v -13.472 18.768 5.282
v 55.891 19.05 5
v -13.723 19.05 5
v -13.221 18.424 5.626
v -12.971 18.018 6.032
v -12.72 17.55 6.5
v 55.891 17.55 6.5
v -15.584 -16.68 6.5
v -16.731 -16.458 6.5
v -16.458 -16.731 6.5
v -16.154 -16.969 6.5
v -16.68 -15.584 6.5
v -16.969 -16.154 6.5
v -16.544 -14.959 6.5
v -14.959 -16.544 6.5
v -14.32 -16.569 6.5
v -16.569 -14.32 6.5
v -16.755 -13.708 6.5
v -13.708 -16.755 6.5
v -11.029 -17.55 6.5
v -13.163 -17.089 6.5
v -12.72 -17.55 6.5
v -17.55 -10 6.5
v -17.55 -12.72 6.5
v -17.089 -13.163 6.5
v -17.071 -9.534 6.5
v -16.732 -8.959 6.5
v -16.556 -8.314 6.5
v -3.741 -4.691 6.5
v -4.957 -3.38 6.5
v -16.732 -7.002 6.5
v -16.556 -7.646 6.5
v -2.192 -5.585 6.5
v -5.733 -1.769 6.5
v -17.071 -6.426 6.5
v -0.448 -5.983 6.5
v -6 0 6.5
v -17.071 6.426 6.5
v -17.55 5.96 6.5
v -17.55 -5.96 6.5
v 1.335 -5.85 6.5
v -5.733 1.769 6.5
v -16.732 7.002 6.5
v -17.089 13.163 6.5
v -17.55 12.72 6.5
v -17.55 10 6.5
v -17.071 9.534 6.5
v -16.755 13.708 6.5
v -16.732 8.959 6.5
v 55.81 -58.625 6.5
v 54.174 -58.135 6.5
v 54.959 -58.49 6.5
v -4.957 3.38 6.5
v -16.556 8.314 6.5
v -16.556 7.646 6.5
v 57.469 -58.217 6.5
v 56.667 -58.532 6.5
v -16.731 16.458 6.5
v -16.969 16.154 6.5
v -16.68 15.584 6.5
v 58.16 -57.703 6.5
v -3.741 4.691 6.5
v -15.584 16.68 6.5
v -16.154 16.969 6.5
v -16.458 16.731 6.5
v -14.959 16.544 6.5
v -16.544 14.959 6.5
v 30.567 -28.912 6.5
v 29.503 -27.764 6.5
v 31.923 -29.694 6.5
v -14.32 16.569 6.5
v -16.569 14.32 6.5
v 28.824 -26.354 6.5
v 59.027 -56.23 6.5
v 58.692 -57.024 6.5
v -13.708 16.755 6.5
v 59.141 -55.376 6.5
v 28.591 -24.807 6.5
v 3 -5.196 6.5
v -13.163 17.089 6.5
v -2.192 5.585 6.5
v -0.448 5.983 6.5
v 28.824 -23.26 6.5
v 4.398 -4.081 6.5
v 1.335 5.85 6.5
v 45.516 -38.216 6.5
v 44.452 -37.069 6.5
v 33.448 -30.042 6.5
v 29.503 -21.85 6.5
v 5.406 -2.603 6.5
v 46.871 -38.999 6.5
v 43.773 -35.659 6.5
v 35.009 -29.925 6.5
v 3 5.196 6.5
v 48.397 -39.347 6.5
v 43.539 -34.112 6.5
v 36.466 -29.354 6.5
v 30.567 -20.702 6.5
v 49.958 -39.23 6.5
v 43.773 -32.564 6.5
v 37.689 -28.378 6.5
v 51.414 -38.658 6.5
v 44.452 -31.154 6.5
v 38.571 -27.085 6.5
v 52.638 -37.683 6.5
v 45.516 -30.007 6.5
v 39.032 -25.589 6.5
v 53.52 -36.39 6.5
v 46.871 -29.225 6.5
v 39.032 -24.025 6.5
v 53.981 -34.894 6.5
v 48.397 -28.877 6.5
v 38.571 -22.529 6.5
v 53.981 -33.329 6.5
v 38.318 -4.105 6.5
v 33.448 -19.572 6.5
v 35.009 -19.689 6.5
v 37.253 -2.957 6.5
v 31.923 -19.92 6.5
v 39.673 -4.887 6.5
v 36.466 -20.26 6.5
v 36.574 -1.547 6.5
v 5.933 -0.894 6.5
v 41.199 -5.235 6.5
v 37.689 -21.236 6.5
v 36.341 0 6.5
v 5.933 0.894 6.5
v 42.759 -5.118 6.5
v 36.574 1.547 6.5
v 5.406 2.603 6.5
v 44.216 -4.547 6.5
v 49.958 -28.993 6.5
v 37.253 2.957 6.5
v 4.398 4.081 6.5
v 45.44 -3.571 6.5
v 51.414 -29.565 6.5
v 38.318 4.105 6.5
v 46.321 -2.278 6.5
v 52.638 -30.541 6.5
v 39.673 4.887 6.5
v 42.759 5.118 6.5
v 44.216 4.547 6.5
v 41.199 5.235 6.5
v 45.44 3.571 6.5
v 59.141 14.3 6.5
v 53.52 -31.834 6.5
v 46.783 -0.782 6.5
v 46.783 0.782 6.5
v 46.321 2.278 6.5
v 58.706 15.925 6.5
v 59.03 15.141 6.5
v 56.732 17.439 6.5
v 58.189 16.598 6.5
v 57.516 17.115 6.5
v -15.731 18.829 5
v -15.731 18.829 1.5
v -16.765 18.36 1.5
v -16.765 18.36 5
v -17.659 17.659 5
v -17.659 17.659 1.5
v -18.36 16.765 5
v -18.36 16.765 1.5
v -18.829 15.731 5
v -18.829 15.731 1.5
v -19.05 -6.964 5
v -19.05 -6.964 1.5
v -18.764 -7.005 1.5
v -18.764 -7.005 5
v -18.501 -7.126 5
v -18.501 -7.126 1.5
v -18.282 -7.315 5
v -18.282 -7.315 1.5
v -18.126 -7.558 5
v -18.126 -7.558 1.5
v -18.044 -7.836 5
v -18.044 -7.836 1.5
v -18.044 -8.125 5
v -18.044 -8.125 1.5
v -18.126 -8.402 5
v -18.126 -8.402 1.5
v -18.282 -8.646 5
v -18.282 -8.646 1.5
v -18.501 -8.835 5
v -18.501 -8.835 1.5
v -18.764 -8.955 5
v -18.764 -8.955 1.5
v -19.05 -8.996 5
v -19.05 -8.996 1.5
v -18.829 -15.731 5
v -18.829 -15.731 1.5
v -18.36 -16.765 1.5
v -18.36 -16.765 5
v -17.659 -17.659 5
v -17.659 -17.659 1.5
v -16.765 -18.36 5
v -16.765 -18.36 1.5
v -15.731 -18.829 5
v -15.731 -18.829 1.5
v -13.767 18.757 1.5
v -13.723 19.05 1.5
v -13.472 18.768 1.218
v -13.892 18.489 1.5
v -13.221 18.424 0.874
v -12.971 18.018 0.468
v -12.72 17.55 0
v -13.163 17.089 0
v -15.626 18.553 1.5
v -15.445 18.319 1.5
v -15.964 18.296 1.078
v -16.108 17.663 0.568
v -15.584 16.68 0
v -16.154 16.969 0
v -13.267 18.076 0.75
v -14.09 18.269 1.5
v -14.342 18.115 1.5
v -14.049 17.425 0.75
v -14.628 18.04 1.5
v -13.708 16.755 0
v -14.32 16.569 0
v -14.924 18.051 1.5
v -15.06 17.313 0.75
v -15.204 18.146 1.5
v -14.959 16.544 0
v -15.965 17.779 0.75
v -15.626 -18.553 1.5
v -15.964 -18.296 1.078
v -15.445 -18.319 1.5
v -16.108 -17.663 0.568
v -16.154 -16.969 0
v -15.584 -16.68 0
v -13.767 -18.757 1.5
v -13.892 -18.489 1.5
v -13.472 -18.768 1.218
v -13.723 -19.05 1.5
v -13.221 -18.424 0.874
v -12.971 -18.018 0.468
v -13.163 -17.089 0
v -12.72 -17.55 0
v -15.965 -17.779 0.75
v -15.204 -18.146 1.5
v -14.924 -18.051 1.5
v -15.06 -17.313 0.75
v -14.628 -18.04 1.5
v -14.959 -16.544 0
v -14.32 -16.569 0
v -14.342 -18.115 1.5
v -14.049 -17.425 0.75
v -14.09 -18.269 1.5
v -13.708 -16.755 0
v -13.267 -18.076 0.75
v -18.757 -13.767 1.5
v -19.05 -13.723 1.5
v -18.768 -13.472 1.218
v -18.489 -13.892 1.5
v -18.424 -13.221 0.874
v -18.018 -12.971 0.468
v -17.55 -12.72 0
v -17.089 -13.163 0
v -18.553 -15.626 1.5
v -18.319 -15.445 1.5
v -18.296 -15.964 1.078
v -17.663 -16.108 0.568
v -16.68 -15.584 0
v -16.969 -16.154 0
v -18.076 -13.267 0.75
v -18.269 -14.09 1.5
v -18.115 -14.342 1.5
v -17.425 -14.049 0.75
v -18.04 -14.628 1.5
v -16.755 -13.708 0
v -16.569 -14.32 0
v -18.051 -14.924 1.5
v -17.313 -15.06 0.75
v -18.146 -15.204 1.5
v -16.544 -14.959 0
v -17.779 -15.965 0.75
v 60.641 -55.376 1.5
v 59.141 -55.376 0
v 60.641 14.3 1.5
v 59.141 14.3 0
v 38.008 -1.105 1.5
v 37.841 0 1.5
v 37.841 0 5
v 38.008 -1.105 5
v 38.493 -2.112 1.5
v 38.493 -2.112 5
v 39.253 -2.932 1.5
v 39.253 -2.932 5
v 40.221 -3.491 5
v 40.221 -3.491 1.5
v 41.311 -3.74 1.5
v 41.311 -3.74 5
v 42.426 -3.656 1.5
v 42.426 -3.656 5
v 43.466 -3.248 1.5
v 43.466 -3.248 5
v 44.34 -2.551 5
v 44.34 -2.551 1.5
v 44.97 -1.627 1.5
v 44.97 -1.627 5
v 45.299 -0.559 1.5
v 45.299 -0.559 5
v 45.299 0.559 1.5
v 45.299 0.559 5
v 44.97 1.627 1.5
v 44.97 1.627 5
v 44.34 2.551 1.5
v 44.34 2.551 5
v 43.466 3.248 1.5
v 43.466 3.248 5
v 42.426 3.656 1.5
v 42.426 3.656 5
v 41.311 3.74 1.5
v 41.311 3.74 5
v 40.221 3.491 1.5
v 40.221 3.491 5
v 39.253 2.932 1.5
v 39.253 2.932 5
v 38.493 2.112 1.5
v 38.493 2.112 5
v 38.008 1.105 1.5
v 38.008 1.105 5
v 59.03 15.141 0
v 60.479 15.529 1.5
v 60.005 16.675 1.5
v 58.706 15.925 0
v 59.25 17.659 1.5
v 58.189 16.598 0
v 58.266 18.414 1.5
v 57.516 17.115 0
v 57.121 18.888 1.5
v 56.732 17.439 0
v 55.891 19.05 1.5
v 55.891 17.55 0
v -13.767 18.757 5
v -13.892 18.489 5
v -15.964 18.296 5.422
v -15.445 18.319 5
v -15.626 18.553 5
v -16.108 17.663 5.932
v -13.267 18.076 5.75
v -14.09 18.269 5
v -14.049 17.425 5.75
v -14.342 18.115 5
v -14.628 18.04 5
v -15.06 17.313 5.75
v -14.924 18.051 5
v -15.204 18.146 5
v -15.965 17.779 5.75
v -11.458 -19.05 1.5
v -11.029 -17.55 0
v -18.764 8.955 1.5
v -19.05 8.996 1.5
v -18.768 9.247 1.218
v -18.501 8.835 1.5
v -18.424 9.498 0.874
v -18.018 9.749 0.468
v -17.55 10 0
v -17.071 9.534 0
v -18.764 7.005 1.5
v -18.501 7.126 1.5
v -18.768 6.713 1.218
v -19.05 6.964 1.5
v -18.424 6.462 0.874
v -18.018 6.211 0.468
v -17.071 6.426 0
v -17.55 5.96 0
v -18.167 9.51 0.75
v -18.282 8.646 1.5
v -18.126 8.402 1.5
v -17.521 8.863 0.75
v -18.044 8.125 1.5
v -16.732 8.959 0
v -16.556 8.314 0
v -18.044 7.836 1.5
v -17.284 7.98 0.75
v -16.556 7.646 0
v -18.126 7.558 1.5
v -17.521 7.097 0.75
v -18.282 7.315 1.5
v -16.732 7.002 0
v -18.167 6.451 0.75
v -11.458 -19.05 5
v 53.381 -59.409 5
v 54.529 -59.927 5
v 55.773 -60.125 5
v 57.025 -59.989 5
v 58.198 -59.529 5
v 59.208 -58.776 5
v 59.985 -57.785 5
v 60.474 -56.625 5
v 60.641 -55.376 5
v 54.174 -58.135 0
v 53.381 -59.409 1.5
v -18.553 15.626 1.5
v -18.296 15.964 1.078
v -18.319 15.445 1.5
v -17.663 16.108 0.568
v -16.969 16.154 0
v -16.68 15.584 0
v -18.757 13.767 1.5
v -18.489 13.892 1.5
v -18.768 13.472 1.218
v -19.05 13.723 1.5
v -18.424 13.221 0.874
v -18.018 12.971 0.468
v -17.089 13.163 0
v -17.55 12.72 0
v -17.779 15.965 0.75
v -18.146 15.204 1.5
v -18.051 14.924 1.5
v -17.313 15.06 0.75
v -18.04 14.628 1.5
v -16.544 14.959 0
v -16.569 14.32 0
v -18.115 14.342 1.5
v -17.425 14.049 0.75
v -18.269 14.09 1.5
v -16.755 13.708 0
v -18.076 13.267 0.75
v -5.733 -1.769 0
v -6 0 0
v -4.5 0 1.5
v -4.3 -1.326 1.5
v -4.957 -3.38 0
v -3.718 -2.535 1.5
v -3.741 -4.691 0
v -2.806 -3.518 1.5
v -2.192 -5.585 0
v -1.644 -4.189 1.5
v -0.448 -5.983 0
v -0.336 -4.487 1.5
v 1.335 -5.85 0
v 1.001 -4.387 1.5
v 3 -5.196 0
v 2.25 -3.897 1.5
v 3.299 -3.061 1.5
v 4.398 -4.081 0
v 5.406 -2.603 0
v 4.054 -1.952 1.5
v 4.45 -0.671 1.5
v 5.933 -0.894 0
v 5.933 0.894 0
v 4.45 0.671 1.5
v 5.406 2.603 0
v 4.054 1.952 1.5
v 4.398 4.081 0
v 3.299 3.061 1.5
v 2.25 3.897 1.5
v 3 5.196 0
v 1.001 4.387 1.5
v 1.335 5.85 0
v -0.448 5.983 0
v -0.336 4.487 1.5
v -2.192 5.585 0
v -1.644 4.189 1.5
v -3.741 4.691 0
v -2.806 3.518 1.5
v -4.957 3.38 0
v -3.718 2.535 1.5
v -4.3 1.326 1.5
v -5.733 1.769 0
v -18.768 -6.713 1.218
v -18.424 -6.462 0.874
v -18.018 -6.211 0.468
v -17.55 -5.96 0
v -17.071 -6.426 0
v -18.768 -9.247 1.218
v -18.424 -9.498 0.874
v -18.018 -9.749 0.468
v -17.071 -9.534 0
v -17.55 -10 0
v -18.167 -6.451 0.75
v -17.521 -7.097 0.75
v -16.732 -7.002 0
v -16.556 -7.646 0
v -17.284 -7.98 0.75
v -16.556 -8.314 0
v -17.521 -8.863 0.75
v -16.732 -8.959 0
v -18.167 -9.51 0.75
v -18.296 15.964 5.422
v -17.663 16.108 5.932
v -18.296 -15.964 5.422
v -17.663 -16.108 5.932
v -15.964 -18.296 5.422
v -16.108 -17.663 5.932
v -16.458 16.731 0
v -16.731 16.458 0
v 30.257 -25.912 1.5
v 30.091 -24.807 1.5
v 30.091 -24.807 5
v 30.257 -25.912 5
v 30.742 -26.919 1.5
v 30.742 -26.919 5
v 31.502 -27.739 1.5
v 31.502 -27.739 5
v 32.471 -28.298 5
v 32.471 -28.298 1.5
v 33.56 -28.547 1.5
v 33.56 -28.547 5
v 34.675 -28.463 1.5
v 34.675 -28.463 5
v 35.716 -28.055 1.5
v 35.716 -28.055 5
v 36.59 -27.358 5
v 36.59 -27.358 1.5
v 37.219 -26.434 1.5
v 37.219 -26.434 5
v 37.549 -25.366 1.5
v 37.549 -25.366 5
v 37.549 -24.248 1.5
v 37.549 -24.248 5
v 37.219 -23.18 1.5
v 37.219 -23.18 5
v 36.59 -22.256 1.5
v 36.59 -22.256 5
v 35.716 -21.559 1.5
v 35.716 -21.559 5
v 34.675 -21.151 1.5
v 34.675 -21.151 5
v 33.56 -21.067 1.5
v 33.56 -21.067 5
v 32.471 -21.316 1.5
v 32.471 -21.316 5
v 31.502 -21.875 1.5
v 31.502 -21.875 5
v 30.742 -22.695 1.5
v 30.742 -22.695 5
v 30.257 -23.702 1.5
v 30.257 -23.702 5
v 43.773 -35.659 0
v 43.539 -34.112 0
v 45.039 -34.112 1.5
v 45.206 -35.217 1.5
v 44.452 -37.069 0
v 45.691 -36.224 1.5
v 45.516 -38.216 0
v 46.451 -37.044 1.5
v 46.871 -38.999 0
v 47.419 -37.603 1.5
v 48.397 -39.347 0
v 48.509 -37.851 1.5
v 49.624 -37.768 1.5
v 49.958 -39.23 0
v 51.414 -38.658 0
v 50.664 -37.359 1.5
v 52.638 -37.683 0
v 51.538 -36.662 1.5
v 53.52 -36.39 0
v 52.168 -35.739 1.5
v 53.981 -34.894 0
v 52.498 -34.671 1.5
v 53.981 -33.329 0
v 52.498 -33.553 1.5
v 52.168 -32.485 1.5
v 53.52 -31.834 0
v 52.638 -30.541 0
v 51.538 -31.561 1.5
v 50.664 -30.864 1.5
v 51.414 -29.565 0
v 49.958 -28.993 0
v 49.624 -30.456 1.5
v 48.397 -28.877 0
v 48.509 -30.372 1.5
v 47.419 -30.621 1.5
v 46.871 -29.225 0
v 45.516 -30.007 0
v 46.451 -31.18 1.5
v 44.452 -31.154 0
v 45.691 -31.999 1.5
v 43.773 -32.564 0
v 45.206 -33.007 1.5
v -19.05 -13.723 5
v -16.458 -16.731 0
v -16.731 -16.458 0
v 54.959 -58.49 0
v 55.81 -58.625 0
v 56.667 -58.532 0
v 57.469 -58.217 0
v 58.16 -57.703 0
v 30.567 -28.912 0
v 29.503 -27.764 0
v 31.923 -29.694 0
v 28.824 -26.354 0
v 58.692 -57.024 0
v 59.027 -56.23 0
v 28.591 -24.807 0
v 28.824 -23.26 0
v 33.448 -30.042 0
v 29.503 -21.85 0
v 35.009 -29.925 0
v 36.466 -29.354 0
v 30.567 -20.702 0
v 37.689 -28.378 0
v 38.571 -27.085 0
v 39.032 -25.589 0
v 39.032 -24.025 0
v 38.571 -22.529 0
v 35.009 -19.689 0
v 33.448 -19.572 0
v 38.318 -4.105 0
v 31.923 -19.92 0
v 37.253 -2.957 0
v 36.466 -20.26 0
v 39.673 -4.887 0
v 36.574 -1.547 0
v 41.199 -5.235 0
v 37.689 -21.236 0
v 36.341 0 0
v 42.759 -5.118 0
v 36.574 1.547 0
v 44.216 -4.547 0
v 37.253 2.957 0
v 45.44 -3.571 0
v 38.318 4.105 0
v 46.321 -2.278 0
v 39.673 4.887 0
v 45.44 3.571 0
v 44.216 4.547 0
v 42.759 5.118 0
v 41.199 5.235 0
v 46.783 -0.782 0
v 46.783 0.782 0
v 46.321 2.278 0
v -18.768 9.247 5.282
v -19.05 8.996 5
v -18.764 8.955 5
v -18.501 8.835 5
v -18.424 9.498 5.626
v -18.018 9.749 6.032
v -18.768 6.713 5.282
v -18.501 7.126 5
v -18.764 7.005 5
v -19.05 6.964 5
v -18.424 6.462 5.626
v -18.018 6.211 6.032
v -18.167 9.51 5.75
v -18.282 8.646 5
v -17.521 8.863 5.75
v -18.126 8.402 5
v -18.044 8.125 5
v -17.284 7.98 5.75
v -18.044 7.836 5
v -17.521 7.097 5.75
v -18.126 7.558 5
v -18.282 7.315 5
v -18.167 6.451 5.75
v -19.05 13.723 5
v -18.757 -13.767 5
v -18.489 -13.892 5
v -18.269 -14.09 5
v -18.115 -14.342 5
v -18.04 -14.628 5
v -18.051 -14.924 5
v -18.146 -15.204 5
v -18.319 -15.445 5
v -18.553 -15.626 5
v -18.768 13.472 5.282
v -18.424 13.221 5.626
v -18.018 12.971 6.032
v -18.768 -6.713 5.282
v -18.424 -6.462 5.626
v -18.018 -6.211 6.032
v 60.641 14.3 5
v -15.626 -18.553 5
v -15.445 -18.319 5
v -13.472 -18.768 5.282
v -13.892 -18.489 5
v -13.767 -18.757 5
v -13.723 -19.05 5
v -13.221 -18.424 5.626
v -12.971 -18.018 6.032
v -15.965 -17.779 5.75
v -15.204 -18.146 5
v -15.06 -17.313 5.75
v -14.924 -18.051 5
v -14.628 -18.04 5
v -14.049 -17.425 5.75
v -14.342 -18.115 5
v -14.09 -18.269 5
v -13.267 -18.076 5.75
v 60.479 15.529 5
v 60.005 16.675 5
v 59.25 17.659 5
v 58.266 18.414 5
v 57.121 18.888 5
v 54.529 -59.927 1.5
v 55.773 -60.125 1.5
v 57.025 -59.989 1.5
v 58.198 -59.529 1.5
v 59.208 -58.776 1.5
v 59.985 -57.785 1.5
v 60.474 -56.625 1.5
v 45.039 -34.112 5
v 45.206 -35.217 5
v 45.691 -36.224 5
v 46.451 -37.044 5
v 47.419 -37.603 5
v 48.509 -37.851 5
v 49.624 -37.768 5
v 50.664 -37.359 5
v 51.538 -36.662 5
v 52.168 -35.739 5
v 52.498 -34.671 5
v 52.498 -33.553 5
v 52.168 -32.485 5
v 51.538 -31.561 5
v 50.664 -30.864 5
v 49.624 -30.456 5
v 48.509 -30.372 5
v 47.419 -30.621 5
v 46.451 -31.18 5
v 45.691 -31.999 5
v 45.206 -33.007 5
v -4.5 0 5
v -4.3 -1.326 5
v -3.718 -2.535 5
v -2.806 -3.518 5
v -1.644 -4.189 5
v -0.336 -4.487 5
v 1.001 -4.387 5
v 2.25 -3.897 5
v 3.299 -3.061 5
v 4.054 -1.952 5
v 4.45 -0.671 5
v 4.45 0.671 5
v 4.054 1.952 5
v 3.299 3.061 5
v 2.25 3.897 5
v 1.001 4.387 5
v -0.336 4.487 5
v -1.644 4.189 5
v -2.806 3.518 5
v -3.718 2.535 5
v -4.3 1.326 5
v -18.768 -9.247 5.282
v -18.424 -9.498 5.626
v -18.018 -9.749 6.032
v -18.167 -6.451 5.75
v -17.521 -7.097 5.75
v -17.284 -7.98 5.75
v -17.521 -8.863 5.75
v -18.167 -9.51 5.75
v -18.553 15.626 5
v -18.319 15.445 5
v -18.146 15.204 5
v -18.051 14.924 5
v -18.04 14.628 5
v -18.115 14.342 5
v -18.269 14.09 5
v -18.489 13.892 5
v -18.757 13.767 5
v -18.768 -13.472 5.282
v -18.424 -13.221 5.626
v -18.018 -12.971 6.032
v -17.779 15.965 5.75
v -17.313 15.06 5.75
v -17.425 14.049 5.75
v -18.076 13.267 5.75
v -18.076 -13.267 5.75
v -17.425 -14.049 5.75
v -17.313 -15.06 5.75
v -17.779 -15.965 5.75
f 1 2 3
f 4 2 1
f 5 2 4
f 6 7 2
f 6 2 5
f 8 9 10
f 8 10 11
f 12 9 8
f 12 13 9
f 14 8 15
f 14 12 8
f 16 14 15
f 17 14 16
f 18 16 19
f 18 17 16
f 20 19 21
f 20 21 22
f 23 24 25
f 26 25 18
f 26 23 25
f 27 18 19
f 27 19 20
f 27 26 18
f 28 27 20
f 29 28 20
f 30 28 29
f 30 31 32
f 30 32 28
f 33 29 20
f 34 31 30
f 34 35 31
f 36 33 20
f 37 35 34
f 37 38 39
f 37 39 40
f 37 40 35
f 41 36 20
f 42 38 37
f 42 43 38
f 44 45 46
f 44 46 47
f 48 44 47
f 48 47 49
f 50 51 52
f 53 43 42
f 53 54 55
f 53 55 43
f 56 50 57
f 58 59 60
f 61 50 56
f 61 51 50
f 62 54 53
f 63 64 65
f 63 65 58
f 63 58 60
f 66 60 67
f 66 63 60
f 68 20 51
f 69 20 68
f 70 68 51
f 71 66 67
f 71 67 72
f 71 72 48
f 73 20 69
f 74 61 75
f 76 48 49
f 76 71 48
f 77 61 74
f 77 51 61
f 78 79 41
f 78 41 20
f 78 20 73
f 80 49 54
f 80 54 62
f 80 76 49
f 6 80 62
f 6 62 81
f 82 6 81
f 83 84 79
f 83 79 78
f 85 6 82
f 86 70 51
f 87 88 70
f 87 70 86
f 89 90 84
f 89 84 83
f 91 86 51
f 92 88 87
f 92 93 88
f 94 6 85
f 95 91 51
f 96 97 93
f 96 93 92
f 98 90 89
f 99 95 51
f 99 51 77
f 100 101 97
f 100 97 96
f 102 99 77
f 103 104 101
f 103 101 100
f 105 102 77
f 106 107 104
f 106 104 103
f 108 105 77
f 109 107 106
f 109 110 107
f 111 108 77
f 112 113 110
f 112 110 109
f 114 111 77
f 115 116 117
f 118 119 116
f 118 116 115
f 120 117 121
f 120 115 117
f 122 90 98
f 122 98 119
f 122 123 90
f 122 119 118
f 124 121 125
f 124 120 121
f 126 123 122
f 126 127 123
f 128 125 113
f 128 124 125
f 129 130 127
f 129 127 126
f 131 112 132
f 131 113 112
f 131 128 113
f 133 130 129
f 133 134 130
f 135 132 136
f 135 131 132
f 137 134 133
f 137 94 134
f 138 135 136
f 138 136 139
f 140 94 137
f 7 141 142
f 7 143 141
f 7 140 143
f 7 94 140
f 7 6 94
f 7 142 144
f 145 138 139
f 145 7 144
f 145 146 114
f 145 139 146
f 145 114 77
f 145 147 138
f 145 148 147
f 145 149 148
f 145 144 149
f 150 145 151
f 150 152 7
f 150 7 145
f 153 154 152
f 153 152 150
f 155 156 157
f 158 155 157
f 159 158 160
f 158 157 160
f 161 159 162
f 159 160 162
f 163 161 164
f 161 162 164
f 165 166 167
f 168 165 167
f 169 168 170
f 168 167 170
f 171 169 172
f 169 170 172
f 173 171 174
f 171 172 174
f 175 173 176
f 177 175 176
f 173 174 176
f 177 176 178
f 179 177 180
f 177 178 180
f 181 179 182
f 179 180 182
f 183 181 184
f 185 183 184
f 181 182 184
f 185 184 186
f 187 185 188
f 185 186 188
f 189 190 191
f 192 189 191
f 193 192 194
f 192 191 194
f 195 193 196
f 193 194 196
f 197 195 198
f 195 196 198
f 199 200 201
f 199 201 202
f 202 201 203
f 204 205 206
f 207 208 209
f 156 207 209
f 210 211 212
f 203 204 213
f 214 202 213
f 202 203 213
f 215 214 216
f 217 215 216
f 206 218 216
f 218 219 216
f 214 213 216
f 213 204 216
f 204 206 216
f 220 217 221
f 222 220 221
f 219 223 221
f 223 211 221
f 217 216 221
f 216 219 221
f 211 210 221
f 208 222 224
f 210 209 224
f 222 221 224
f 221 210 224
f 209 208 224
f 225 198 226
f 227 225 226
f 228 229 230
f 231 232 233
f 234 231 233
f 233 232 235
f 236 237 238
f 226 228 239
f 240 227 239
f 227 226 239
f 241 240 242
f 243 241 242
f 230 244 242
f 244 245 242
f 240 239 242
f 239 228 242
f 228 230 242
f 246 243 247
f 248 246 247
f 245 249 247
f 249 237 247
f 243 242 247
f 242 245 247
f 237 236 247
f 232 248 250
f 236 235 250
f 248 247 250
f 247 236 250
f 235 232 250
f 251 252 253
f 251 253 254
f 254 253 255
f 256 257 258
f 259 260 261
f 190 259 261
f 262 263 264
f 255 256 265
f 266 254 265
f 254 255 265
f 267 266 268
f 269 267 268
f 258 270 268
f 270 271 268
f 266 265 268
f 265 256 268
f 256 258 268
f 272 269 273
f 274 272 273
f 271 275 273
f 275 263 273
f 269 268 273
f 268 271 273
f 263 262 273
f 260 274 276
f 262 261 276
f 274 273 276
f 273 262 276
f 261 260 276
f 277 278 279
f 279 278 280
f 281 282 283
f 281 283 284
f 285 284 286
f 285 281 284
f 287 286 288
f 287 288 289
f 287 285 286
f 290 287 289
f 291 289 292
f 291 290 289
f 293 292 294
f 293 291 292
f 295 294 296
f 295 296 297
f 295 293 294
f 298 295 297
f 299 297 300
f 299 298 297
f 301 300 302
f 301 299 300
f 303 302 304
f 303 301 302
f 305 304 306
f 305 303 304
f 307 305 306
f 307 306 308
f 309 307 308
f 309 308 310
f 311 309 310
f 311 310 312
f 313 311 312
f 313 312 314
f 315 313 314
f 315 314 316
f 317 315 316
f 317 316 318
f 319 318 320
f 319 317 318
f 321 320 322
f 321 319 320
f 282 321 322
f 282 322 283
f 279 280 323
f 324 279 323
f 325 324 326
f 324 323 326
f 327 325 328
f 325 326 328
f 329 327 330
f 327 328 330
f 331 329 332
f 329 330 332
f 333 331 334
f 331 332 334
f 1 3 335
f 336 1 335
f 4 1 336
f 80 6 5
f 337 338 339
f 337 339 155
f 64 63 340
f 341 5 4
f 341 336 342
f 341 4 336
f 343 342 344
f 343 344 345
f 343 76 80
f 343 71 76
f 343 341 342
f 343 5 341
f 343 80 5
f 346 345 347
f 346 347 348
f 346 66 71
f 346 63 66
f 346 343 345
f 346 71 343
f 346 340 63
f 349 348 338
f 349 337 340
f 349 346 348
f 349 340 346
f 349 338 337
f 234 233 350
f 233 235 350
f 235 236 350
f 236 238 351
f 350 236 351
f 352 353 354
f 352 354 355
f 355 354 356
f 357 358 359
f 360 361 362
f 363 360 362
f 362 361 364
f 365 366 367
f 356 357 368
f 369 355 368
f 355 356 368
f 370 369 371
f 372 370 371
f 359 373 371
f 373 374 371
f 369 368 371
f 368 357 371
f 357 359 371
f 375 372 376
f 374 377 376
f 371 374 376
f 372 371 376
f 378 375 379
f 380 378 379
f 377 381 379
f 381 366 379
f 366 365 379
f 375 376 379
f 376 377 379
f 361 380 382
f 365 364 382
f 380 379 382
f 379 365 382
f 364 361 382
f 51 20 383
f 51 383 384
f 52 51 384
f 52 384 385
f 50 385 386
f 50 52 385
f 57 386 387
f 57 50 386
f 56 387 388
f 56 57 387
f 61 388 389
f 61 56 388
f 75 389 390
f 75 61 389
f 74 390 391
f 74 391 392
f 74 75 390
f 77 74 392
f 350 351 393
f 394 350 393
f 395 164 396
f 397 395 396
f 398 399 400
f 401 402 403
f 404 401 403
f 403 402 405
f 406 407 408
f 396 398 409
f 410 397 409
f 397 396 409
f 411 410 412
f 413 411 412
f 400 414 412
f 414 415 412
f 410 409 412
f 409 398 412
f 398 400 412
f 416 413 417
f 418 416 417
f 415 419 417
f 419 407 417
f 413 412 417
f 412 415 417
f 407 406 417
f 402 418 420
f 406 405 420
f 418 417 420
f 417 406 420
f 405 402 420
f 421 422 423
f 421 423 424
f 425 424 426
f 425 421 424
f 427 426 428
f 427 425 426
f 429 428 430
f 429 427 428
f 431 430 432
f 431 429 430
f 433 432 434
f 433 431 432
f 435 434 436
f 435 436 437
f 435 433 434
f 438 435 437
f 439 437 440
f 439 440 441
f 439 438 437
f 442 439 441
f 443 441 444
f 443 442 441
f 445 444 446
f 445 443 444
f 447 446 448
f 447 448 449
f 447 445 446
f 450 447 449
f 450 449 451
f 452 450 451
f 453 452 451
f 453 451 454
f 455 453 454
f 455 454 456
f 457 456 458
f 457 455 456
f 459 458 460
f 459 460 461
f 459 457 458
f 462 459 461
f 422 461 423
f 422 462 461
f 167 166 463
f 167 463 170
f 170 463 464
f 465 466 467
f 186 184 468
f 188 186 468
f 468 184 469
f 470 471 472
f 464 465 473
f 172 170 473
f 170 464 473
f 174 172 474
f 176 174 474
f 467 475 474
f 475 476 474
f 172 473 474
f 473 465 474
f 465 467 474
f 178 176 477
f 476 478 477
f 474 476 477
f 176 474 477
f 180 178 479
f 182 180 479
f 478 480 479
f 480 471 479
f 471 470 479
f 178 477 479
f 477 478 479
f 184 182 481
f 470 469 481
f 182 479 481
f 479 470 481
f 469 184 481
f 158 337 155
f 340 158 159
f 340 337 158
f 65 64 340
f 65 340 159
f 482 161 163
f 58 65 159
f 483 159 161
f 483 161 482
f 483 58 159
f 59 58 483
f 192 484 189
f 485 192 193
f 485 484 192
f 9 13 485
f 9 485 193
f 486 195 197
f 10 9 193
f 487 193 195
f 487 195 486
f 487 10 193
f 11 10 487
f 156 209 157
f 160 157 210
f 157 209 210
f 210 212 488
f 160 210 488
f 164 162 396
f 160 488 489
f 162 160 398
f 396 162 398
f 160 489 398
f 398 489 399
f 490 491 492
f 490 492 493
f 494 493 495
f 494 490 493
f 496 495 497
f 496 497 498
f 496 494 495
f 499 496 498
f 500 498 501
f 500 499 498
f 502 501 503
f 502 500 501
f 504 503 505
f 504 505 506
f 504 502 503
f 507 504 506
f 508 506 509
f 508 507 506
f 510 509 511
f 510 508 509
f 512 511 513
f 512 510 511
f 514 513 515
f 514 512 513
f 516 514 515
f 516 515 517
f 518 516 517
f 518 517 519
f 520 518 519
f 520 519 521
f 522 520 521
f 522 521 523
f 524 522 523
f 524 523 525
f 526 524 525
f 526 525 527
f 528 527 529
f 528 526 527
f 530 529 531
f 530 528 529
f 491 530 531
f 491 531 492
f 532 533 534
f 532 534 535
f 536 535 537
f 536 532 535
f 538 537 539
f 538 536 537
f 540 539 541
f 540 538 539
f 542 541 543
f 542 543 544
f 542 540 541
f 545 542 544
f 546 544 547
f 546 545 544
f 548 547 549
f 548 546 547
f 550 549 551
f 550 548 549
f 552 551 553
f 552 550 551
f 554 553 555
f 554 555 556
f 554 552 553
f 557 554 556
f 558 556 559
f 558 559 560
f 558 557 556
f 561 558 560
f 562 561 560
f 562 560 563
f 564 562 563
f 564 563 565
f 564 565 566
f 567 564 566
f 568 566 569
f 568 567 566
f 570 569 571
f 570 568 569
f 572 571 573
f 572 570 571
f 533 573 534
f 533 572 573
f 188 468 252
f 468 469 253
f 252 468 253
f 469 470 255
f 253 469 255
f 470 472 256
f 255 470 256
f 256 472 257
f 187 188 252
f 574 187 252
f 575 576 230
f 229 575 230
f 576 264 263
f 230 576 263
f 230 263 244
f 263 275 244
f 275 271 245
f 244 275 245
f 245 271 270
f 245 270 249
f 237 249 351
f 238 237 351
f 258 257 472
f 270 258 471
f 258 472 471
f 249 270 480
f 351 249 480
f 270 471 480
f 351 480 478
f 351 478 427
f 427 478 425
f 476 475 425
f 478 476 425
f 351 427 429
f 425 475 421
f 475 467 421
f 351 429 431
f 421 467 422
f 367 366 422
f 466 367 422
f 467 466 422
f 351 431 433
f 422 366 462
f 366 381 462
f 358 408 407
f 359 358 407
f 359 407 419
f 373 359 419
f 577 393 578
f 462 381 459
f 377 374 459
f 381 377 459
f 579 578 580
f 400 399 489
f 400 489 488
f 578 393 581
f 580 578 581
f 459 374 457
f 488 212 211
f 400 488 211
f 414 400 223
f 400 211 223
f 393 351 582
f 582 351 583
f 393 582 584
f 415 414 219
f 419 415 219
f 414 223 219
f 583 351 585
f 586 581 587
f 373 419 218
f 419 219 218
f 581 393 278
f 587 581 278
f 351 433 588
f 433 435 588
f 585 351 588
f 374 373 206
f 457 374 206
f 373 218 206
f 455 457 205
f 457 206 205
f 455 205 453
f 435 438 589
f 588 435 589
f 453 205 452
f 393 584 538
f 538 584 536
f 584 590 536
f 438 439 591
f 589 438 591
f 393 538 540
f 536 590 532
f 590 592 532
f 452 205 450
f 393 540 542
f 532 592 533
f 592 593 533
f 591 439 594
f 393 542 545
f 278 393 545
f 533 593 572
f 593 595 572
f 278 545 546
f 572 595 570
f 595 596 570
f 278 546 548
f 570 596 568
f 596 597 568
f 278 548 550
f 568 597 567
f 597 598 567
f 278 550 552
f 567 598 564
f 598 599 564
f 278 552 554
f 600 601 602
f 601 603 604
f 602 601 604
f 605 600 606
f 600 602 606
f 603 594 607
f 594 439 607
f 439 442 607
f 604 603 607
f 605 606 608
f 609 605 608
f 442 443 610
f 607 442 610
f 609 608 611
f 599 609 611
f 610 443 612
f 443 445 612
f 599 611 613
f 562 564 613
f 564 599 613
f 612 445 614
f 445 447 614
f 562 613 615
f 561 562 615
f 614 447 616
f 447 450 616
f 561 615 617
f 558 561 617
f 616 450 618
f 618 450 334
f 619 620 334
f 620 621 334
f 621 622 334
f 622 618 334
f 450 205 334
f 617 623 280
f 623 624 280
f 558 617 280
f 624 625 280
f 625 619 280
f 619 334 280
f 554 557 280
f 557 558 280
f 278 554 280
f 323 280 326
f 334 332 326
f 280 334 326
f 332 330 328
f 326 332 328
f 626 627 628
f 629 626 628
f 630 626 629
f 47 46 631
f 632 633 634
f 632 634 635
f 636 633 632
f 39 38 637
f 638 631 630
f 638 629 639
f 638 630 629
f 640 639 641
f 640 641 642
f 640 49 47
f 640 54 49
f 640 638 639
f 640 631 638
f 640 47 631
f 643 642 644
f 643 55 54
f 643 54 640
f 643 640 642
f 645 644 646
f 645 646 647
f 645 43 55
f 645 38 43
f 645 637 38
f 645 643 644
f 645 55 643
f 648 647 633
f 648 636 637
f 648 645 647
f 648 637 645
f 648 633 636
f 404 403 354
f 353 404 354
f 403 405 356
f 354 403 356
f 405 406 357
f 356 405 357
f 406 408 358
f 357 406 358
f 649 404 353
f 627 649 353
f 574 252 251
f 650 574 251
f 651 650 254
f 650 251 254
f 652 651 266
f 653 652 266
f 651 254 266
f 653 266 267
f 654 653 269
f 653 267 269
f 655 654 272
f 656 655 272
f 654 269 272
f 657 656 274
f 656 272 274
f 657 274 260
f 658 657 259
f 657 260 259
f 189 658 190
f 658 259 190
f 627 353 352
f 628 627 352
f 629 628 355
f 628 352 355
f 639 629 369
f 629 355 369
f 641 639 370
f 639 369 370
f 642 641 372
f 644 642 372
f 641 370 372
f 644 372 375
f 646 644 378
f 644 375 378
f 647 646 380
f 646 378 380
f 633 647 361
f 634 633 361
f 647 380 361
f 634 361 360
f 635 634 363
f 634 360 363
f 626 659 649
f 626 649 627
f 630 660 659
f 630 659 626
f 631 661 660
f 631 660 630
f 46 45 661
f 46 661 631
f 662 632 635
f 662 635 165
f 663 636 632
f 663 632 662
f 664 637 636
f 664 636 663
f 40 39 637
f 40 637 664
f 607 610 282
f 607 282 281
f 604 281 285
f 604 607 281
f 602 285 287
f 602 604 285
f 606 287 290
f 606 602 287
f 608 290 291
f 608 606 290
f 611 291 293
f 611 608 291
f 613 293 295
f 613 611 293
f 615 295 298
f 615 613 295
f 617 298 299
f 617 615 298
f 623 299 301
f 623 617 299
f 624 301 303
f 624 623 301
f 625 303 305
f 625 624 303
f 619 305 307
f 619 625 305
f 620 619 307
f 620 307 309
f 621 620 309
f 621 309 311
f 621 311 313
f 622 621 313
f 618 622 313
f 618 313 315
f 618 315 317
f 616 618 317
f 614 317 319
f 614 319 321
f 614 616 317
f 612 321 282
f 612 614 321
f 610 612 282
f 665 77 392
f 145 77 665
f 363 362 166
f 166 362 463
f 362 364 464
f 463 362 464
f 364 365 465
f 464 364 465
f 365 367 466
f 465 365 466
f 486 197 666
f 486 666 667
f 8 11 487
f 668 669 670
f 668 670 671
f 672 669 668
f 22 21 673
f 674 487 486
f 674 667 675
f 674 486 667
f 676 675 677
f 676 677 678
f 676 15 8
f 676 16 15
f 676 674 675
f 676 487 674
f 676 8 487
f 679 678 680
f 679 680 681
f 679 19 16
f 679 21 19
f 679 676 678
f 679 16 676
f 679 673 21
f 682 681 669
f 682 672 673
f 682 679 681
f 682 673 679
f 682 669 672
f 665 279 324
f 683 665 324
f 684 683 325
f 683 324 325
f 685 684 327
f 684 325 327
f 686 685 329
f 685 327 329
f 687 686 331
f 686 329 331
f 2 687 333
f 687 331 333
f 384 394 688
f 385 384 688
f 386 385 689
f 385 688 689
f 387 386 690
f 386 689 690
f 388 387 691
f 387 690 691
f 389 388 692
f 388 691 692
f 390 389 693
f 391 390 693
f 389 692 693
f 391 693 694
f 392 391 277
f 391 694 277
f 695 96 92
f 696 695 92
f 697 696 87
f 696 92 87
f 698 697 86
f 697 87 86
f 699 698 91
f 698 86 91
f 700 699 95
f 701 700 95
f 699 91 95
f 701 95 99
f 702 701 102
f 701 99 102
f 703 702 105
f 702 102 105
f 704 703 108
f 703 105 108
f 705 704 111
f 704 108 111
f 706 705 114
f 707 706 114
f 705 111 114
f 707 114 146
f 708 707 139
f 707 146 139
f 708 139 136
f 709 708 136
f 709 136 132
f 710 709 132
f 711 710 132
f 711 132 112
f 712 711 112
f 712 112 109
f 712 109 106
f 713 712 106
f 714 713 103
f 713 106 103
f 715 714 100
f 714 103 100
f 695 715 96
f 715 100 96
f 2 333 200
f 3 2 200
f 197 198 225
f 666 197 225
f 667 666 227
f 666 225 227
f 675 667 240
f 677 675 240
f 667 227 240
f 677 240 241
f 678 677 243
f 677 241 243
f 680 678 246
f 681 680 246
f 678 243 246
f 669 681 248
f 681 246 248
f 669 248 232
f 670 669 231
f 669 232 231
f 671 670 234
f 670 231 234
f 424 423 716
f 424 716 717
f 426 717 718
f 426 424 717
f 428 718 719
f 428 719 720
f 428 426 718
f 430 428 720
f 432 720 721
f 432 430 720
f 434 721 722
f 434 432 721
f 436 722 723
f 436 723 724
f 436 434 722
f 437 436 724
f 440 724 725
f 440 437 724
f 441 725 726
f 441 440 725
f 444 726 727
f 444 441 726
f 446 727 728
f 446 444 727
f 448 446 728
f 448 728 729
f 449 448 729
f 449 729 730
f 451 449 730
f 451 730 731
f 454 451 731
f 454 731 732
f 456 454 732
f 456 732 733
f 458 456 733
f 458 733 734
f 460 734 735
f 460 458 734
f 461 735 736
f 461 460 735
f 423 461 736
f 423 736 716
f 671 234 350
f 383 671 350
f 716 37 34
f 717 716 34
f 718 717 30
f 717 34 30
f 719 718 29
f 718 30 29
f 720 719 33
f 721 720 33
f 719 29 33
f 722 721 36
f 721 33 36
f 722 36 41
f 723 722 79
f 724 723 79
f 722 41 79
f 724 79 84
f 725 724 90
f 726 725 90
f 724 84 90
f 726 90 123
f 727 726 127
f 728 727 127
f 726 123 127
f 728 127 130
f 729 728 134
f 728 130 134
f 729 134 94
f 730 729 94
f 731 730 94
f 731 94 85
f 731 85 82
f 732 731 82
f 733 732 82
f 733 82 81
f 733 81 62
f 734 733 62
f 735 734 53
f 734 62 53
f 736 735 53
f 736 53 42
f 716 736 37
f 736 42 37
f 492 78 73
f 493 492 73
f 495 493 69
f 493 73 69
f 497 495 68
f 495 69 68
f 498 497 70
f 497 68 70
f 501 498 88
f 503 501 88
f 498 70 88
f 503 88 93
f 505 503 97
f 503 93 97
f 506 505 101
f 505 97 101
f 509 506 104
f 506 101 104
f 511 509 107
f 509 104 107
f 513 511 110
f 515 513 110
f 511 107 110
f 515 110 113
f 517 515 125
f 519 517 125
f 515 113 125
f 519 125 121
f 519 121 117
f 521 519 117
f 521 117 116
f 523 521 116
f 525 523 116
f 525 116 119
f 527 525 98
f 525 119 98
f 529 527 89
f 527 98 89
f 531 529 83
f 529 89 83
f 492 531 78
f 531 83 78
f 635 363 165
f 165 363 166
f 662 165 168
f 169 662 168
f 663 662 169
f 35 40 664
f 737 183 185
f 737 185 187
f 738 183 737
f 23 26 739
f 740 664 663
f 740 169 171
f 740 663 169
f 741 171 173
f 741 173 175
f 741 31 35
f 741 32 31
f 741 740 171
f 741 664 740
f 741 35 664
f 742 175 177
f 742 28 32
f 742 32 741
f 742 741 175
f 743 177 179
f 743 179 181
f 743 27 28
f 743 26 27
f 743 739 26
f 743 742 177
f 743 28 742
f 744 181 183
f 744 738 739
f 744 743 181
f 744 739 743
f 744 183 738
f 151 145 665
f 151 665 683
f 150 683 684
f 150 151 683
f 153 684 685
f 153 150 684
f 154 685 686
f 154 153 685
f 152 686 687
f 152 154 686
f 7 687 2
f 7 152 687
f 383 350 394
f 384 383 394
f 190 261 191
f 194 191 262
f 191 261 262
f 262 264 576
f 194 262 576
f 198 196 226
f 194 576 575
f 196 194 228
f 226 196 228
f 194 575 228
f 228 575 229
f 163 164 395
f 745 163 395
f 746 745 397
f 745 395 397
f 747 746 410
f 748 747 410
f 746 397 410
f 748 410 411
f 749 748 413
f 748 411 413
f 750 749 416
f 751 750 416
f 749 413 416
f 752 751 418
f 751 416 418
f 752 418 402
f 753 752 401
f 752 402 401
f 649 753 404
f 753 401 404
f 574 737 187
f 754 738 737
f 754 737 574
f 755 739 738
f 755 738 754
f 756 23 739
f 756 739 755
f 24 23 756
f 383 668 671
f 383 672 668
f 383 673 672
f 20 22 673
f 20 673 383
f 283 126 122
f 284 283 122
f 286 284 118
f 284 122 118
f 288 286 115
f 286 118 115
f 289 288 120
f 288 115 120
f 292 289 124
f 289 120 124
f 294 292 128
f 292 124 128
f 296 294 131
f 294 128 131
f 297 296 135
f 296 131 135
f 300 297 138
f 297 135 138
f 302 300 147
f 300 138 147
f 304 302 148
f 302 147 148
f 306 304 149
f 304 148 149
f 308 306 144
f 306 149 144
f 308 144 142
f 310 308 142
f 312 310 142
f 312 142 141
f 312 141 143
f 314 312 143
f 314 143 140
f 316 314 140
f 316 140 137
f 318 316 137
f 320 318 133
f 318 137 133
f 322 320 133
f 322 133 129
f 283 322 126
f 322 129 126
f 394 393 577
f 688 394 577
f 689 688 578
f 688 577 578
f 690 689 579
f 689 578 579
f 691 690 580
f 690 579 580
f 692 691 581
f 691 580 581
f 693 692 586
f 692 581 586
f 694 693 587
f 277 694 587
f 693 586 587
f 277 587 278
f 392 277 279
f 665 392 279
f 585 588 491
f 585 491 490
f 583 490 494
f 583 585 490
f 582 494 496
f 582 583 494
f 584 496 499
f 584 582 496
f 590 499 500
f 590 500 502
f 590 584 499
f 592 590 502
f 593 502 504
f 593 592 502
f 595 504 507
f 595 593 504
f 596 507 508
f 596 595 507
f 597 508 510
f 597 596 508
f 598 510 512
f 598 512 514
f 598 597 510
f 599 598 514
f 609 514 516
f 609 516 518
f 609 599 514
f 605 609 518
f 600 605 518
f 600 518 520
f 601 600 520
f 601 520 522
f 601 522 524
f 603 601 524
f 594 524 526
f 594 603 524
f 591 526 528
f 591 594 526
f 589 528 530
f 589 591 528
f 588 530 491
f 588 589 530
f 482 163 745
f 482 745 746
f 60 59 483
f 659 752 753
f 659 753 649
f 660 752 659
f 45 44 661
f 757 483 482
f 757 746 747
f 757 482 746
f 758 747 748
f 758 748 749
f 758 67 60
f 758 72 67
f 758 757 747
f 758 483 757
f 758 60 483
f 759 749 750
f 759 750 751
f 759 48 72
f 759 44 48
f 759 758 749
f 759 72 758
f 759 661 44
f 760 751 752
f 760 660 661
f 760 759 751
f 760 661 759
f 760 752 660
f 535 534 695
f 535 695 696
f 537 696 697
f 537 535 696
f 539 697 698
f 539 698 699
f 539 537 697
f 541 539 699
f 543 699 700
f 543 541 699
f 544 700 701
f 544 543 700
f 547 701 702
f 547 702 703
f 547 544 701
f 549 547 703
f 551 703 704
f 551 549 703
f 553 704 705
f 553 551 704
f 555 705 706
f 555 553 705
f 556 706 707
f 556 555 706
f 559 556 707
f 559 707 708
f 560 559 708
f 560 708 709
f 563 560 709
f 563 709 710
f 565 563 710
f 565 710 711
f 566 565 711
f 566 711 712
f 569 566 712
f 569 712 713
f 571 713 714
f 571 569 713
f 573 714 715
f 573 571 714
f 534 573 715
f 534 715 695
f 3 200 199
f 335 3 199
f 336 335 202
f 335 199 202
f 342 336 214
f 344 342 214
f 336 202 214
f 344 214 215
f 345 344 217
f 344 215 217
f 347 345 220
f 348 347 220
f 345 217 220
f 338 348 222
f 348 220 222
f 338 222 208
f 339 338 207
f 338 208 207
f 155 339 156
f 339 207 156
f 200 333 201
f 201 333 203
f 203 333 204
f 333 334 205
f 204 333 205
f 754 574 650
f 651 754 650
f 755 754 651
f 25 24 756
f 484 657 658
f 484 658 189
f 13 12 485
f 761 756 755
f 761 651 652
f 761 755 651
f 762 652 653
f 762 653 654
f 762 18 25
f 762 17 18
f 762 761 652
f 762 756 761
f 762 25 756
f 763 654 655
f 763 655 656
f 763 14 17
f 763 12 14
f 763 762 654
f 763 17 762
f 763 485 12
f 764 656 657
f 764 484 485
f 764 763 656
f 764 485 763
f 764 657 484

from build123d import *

# Parameters (mm, degrees)
SKETCH1_R           = 3.75
SKETCH1_R_2         = 4.5
BOSS_EXTRUDE1_DEPTH = 6.5
CHAMFER1_SIZE       = 1.5


with BuildPart() as part:
    # Sketch1 → Boss-Extrude1 (new body)
    with BuildSketch(Plane.XY):
        with BuildLine():
            Line((-11.458079381, -19.05), (53.381074139, -59.408818568))
            ThreePointArc((53.381074139, -59.408818568), (58.197626483, -59.528635467), (60.641156228, -55.376203052))
            Line((60.641156228, -55.376203052), (60.641156228, 14.3))
            ThreePointArc((60.641156228, 14.3), (59.249913439, 17.658757211), (55.891156228, 19.05))
            Line((55.891156228, 19.05), (-13.723477062, 19.05))
            ThreePointArc((-13.723477062, 19.05), (-14.628464695, 18.040083046), (-15.73121772, 18.829304583))
            ThreePointArc((-15.73121772, 18.829304583), (-17.658815789, 17.658815789), (-18.829304583, 15.73121772))
            ThreePointArc((-18.829304583, 15.73121772), (-18.040083046, 14.628464695), (-19.05, 13.723477062))
            Line((-19.05, 13.723477062), (-19.05, 8.996305235))
            ThreePointArc((-19.05, 8.996305235), (-18.034, 7.980305235), (-19.05, 6.964305235))
            Line((-19.05, 6.964305235), (-19.05, -6.964305235))
            ThreePointArc((-19.05, -6.964305235), (-18.034, -7.980305235), (-19.05, -8.996305235))
            Line((-19.05, -8.996305235), (-19.05, -13.723477062))
            ThreePointArc((-19.05, -13.723477062), (-18.040083046, -14.628464695), (-18.829304583, -15.73121772))
            ThreePointArc((-18.829304583, -15.73121772), (-17.658815789, -17.658815789), (-15.73121772, -18.829304583))
            ThreePointArc((-15.73121772, -18.829304583), (-14.628464695, -18.040083046), (-13.723477062, -19.05))
            Line((-13.723477062, -19.05), (-11.458079381, -19.05))
        make_face()
        with Locations(Location((48.789415314, -34.11185183, 0), (0, 0, 180))):
            Circle(SKETCH1_R, mode=Mode.SUBTRACT)
        with Locations(Location((33.840565899, -24.807012569, 0), (0, 0, 180))):
            Circle(SKETCH1_R, mode=Mode.SUBTRACT)
        with Locations(Location((41.591156228, 0, 0), (0, 0, 180))):
            Circle(SKETCH1_R, mode=Mode.SUBTRACT)
        with Locations(Location((0, 0, 0), (0, 0, 180))):
            Circle(SKETCH1_R_2, mode=Mode.SUBTRACT)
    extrude(amount=BOSS_EXTRUDE1_DEPTH)

    # Chamfer1
    chamfer1_edges = [part.edges().sort_by_distance(p)[0] for p in [
        (-14.628464695, -18.040083046, 6.5),
        (4.5, 0, 6.5),
        (45.341156228, 0, 6.5),
        (37.590565899, -24.807012569, 6.5),
        (52.539415314, -34.11185183, 6.5),
        (-12.590778221, -19.05, 6.5),
        (20.961497379, -39.229409284, 6.5),
        (52.539415314, -34.11185183, 0),
        (37.590565899, -24.807012569, 0),
        (58.197626483, -59.528635467, 6.5),
        (45.341156228, 0, 0),
        (4.5, 0, 0),
        (-17.658815789, -17.658815789, 0),
        (-18.040083046, -14.628464695, 0),
        (-19.05, -11.359891149, 0),
        (-18.034, -7.980305235, 0),
        (-19.05, 0, 0),
        (-18.034, 7.980305235, 0),
        (-19.05, 11.359891149, 0),
        (-18.040083046, 14.628464695, 0),
        (60.641156228, -20.538101526, 6.5),
        (-17.658815789, 17.658815789, 0),
        (-14.628464695, 18.040083046, 0),
        (21.083839583, 19.05, 0),
        (59.249913439, 17.658757211, 0),
        (60.641156228, -20.538101526, 0),
        (58.197626483, -59.528635467, 0),
        (20.961497379, -39.229409284, 0),
        (-12.590778221, -19.05, 0),
        (-14.628464695, -18.040083046, 0),
        (59.249913439, 17.658757211, 6.5),
        (21.083839583, 19.05, 6.5),
        (-14.628464695, 18.040083046, 6.5),
        (-17.658815789, 17.658815789, 6.5),
        (-18.040083046, 14.628464695, 6.5),
        (-19.05, 11.359891149, 6.5),
        (-18.034, 7.980305235, 6.5),
        (-19.05, 0, 6.5),
        (-18.034, -7.980305235, 6.5),
        (-19.05, -11.359891149, 6.5),
        (-18.040083046, -14.628464695, 6.5),
        (-17.658815789, -17.658815789, 6.5),
    ]]
    chamfer(chamfer1_edges, length=CHAMFER1_SIZE)


solid = part.part
